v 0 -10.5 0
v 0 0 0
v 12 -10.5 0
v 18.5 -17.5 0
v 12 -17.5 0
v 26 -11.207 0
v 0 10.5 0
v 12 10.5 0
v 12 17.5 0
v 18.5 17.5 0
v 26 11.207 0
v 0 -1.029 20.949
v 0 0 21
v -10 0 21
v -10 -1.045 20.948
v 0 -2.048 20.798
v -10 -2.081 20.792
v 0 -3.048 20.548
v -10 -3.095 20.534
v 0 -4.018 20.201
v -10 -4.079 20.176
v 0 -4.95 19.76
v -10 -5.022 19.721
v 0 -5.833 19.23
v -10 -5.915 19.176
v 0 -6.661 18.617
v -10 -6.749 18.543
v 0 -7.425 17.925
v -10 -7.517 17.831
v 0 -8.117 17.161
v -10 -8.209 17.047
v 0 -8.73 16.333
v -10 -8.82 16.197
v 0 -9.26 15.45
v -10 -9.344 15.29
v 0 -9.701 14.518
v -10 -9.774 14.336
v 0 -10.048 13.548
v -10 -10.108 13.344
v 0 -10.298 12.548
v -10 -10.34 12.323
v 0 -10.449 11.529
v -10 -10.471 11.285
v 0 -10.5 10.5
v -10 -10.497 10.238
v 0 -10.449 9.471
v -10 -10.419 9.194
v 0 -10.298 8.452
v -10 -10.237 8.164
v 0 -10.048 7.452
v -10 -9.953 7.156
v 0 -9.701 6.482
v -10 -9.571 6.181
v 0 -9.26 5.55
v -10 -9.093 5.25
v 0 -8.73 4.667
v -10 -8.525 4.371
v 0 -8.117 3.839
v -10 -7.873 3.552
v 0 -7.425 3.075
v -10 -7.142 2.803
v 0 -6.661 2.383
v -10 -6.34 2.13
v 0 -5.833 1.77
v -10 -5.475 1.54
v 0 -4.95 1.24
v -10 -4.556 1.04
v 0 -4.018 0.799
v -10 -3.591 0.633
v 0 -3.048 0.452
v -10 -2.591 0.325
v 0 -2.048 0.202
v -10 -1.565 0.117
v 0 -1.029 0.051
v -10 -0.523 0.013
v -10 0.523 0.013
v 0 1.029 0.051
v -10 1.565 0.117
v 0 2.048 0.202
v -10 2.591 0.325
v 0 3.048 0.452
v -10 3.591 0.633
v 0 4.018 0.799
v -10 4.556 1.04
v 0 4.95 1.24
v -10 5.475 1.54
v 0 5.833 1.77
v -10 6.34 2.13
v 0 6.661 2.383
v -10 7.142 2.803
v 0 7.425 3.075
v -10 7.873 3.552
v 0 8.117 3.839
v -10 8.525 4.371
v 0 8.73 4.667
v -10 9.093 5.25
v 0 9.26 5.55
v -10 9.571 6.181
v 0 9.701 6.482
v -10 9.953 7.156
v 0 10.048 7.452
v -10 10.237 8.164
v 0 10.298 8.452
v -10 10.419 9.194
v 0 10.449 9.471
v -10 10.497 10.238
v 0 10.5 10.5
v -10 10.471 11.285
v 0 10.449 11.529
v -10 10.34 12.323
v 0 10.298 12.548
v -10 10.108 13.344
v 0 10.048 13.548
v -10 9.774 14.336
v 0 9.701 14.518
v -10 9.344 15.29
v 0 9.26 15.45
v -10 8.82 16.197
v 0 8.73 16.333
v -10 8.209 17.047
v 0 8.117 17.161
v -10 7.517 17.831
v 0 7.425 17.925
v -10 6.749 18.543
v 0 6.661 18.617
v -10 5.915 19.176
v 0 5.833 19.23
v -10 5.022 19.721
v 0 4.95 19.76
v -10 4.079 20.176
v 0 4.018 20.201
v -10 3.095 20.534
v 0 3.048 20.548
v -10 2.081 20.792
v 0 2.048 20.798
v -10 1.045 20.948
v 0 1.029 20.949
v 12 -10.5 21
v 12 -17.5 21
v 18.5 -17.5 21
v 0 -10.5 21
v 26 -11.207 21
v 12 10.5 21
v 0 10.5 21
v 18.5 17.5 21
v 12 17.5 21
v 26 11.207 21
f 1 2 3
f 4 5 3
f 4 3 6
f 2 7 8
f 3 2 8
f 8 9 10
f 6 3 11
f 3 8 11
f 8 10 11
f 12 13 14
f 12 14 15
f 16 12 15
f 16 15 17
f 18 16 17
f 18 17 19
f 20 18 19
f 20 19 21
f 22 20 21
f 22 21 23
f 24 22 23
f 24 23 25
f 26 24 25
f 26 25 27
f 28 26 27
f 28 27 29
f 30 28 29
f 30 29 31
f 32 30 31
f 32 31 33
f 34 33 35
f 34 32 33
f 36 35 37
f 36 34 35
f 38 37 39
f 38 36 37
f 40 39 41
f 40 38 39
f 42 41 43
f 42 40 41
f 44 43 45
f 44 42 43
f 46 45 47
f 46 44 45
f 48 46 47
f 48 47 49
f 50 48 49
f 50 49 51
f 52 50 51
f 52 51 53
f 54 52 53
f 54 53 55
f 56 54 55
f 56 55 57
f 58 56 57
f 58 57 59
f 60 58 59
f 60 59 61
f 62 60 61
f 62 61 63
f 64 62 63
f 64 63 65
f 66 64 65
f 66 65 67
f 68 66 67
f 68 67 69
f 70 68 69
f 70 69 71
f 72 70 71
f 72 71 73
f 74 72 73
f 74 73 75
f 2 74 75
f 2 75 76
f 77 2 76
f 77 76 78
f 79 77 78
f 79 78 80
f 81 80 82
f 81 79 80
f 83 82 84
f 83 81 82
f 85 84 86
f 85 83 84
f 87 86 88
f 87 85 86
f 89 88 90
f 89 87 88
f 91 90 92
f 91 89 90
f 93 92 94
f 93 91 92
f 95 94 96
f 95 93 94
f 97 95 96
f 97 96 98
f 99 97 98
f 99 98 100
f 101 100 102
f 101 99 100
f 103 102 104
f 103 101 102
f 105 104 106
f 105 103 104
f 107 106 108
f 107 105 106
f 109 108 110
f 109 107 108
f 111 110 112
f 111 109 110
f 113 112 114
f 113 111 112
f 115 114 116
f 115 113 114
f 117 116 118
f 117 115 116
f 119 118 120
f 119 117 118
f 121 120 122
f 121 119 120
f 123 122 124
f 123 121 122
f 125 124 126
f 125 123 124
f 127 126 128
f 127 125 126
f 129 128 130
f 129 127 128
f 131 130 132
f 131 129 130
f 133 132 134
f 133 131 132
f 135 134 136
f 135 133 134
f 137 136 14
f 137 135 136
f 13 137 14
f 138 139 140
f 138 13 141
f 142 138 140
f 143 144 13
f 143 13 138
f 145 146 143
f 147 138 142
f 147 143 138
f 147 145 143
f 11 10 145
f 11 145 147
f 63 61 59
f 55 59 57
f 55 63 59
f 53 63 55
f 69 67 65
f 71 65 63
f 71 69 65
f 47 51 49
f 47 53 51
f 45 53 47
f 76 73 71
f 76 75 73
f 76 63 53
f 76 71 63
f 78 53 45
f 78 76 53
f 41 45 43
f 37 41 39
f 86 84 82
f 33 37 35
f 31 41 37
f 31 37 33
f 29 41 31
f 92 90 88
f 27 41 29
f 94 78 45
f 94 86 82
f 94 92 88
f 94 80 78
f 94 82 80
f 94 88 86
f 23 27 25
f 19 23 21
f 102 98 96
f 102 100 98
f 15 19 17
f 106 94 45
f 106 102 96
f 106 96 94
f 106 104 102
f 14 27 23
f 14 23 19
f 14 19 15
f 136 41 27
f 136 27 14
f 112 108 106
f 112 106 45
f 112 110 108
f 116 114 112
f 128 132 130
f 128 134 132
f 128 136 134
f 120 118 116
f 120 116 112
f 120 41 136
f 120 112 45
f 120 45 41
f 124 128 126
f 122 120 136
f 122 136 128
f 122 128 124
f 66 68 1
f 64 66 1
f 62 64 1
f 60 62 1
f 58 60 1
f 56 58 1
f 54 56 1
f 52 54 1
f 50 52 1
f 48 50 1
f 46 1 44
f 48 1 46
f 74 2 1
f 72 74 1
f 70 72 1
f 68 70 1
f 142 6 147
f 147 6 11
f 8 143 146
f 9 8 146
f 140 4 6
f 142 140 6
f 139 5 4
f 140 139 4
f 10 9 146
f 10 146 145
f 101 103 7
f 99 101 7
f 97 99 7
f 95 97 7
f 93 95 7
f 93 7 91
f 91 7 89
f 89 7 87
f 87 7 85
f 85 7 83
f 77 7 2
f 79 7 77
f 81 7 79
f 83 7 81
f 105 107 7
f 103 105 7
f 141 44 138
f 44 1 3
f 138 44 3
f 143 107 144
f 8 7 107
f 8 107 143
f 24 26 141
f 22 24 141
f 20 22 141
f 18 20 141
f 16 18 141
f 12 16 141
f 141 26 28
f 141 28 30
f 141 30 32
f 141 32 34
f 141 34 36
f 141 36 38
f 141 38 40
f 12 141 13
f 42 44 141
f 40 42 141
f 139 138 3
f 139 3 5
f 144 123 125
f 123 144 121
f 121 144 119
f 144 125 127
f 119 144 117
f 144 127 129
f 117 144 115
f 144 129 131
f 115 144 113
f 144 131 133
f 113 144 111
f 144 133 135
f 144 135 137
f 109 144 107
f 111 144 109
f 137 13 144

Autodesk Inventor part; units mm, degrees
ref_plane "YZ Plane" through (0, 0, 0) normal (1, 0, 0) x (0, 1, 0)
ref_plane "XZ Plane" through (0, 0, 0) normal (0, 1, 0) x (-1, 0, 0)
ref_plane "XY Plane" through (0, 0, 0) normal (0, 0, 1) x (1, 0, 0)
sketch "Sketch1" plane through (0, 0, 0) normal (0, 0, 1) x (1, 0, 0)
  line L0 (0, 10.5) -> (12, 10.5)
  line L1 (12, 10.5) -> (12, 17.5)
  line L2 (12, 17.5) -> (18.5, 17.5)
  line L3 (18.5, 17.5) -> (26, 11.2068)
  line L4 (0, 10.5) -> (0, -10.5)
  line L5 (0, -10.5) -> (12, -10.5)
  line L6 (12, -10.5) -> (12, -17.5)
  line L7 (12, -17.5) -> (18.5, -17.5)
  line L8 (18.5, -17.5) -> (26, -11.2068)
  line L9 (26, -11.2068) -> (26, 11.2068)
  point P0 (0, 0)
  point P1 (0, 0)
  dimension "d0" = 12
  dimension "d1" = 7
  dimension "d2" = 6.5
  dimension "d3" = 21
  dimension "d5" = 14
  dimension "d8" = 140
  dimension "d9" = 140
extrude "Extrusion1" add sketch "Sketch1" along normal blind 21
sketch "Sketch2" plane through (0, -10.5, 0) normal (-1, 0, 0) x (0, 0, 1)
  line L0 (0, 21) -> (0, 0) projected
  line L1 (0, 21) -> (0, 0) projected
  line L2 (0, 0) -> (21, 0) projected
  line L3 (21, 21) -> (21, 0) projected
  line L4 (0, 21) -> (21, 21) projected
  circle A0 centre (10.5, 10.5) radius 10.5
  point P0 (0, 10.5)
extrude "Extrusion2" add sketch "Sketch2" along normal blind 10 contours A0
equation "\"d9\" = d8"
properties part number "m_Schienenteil"
